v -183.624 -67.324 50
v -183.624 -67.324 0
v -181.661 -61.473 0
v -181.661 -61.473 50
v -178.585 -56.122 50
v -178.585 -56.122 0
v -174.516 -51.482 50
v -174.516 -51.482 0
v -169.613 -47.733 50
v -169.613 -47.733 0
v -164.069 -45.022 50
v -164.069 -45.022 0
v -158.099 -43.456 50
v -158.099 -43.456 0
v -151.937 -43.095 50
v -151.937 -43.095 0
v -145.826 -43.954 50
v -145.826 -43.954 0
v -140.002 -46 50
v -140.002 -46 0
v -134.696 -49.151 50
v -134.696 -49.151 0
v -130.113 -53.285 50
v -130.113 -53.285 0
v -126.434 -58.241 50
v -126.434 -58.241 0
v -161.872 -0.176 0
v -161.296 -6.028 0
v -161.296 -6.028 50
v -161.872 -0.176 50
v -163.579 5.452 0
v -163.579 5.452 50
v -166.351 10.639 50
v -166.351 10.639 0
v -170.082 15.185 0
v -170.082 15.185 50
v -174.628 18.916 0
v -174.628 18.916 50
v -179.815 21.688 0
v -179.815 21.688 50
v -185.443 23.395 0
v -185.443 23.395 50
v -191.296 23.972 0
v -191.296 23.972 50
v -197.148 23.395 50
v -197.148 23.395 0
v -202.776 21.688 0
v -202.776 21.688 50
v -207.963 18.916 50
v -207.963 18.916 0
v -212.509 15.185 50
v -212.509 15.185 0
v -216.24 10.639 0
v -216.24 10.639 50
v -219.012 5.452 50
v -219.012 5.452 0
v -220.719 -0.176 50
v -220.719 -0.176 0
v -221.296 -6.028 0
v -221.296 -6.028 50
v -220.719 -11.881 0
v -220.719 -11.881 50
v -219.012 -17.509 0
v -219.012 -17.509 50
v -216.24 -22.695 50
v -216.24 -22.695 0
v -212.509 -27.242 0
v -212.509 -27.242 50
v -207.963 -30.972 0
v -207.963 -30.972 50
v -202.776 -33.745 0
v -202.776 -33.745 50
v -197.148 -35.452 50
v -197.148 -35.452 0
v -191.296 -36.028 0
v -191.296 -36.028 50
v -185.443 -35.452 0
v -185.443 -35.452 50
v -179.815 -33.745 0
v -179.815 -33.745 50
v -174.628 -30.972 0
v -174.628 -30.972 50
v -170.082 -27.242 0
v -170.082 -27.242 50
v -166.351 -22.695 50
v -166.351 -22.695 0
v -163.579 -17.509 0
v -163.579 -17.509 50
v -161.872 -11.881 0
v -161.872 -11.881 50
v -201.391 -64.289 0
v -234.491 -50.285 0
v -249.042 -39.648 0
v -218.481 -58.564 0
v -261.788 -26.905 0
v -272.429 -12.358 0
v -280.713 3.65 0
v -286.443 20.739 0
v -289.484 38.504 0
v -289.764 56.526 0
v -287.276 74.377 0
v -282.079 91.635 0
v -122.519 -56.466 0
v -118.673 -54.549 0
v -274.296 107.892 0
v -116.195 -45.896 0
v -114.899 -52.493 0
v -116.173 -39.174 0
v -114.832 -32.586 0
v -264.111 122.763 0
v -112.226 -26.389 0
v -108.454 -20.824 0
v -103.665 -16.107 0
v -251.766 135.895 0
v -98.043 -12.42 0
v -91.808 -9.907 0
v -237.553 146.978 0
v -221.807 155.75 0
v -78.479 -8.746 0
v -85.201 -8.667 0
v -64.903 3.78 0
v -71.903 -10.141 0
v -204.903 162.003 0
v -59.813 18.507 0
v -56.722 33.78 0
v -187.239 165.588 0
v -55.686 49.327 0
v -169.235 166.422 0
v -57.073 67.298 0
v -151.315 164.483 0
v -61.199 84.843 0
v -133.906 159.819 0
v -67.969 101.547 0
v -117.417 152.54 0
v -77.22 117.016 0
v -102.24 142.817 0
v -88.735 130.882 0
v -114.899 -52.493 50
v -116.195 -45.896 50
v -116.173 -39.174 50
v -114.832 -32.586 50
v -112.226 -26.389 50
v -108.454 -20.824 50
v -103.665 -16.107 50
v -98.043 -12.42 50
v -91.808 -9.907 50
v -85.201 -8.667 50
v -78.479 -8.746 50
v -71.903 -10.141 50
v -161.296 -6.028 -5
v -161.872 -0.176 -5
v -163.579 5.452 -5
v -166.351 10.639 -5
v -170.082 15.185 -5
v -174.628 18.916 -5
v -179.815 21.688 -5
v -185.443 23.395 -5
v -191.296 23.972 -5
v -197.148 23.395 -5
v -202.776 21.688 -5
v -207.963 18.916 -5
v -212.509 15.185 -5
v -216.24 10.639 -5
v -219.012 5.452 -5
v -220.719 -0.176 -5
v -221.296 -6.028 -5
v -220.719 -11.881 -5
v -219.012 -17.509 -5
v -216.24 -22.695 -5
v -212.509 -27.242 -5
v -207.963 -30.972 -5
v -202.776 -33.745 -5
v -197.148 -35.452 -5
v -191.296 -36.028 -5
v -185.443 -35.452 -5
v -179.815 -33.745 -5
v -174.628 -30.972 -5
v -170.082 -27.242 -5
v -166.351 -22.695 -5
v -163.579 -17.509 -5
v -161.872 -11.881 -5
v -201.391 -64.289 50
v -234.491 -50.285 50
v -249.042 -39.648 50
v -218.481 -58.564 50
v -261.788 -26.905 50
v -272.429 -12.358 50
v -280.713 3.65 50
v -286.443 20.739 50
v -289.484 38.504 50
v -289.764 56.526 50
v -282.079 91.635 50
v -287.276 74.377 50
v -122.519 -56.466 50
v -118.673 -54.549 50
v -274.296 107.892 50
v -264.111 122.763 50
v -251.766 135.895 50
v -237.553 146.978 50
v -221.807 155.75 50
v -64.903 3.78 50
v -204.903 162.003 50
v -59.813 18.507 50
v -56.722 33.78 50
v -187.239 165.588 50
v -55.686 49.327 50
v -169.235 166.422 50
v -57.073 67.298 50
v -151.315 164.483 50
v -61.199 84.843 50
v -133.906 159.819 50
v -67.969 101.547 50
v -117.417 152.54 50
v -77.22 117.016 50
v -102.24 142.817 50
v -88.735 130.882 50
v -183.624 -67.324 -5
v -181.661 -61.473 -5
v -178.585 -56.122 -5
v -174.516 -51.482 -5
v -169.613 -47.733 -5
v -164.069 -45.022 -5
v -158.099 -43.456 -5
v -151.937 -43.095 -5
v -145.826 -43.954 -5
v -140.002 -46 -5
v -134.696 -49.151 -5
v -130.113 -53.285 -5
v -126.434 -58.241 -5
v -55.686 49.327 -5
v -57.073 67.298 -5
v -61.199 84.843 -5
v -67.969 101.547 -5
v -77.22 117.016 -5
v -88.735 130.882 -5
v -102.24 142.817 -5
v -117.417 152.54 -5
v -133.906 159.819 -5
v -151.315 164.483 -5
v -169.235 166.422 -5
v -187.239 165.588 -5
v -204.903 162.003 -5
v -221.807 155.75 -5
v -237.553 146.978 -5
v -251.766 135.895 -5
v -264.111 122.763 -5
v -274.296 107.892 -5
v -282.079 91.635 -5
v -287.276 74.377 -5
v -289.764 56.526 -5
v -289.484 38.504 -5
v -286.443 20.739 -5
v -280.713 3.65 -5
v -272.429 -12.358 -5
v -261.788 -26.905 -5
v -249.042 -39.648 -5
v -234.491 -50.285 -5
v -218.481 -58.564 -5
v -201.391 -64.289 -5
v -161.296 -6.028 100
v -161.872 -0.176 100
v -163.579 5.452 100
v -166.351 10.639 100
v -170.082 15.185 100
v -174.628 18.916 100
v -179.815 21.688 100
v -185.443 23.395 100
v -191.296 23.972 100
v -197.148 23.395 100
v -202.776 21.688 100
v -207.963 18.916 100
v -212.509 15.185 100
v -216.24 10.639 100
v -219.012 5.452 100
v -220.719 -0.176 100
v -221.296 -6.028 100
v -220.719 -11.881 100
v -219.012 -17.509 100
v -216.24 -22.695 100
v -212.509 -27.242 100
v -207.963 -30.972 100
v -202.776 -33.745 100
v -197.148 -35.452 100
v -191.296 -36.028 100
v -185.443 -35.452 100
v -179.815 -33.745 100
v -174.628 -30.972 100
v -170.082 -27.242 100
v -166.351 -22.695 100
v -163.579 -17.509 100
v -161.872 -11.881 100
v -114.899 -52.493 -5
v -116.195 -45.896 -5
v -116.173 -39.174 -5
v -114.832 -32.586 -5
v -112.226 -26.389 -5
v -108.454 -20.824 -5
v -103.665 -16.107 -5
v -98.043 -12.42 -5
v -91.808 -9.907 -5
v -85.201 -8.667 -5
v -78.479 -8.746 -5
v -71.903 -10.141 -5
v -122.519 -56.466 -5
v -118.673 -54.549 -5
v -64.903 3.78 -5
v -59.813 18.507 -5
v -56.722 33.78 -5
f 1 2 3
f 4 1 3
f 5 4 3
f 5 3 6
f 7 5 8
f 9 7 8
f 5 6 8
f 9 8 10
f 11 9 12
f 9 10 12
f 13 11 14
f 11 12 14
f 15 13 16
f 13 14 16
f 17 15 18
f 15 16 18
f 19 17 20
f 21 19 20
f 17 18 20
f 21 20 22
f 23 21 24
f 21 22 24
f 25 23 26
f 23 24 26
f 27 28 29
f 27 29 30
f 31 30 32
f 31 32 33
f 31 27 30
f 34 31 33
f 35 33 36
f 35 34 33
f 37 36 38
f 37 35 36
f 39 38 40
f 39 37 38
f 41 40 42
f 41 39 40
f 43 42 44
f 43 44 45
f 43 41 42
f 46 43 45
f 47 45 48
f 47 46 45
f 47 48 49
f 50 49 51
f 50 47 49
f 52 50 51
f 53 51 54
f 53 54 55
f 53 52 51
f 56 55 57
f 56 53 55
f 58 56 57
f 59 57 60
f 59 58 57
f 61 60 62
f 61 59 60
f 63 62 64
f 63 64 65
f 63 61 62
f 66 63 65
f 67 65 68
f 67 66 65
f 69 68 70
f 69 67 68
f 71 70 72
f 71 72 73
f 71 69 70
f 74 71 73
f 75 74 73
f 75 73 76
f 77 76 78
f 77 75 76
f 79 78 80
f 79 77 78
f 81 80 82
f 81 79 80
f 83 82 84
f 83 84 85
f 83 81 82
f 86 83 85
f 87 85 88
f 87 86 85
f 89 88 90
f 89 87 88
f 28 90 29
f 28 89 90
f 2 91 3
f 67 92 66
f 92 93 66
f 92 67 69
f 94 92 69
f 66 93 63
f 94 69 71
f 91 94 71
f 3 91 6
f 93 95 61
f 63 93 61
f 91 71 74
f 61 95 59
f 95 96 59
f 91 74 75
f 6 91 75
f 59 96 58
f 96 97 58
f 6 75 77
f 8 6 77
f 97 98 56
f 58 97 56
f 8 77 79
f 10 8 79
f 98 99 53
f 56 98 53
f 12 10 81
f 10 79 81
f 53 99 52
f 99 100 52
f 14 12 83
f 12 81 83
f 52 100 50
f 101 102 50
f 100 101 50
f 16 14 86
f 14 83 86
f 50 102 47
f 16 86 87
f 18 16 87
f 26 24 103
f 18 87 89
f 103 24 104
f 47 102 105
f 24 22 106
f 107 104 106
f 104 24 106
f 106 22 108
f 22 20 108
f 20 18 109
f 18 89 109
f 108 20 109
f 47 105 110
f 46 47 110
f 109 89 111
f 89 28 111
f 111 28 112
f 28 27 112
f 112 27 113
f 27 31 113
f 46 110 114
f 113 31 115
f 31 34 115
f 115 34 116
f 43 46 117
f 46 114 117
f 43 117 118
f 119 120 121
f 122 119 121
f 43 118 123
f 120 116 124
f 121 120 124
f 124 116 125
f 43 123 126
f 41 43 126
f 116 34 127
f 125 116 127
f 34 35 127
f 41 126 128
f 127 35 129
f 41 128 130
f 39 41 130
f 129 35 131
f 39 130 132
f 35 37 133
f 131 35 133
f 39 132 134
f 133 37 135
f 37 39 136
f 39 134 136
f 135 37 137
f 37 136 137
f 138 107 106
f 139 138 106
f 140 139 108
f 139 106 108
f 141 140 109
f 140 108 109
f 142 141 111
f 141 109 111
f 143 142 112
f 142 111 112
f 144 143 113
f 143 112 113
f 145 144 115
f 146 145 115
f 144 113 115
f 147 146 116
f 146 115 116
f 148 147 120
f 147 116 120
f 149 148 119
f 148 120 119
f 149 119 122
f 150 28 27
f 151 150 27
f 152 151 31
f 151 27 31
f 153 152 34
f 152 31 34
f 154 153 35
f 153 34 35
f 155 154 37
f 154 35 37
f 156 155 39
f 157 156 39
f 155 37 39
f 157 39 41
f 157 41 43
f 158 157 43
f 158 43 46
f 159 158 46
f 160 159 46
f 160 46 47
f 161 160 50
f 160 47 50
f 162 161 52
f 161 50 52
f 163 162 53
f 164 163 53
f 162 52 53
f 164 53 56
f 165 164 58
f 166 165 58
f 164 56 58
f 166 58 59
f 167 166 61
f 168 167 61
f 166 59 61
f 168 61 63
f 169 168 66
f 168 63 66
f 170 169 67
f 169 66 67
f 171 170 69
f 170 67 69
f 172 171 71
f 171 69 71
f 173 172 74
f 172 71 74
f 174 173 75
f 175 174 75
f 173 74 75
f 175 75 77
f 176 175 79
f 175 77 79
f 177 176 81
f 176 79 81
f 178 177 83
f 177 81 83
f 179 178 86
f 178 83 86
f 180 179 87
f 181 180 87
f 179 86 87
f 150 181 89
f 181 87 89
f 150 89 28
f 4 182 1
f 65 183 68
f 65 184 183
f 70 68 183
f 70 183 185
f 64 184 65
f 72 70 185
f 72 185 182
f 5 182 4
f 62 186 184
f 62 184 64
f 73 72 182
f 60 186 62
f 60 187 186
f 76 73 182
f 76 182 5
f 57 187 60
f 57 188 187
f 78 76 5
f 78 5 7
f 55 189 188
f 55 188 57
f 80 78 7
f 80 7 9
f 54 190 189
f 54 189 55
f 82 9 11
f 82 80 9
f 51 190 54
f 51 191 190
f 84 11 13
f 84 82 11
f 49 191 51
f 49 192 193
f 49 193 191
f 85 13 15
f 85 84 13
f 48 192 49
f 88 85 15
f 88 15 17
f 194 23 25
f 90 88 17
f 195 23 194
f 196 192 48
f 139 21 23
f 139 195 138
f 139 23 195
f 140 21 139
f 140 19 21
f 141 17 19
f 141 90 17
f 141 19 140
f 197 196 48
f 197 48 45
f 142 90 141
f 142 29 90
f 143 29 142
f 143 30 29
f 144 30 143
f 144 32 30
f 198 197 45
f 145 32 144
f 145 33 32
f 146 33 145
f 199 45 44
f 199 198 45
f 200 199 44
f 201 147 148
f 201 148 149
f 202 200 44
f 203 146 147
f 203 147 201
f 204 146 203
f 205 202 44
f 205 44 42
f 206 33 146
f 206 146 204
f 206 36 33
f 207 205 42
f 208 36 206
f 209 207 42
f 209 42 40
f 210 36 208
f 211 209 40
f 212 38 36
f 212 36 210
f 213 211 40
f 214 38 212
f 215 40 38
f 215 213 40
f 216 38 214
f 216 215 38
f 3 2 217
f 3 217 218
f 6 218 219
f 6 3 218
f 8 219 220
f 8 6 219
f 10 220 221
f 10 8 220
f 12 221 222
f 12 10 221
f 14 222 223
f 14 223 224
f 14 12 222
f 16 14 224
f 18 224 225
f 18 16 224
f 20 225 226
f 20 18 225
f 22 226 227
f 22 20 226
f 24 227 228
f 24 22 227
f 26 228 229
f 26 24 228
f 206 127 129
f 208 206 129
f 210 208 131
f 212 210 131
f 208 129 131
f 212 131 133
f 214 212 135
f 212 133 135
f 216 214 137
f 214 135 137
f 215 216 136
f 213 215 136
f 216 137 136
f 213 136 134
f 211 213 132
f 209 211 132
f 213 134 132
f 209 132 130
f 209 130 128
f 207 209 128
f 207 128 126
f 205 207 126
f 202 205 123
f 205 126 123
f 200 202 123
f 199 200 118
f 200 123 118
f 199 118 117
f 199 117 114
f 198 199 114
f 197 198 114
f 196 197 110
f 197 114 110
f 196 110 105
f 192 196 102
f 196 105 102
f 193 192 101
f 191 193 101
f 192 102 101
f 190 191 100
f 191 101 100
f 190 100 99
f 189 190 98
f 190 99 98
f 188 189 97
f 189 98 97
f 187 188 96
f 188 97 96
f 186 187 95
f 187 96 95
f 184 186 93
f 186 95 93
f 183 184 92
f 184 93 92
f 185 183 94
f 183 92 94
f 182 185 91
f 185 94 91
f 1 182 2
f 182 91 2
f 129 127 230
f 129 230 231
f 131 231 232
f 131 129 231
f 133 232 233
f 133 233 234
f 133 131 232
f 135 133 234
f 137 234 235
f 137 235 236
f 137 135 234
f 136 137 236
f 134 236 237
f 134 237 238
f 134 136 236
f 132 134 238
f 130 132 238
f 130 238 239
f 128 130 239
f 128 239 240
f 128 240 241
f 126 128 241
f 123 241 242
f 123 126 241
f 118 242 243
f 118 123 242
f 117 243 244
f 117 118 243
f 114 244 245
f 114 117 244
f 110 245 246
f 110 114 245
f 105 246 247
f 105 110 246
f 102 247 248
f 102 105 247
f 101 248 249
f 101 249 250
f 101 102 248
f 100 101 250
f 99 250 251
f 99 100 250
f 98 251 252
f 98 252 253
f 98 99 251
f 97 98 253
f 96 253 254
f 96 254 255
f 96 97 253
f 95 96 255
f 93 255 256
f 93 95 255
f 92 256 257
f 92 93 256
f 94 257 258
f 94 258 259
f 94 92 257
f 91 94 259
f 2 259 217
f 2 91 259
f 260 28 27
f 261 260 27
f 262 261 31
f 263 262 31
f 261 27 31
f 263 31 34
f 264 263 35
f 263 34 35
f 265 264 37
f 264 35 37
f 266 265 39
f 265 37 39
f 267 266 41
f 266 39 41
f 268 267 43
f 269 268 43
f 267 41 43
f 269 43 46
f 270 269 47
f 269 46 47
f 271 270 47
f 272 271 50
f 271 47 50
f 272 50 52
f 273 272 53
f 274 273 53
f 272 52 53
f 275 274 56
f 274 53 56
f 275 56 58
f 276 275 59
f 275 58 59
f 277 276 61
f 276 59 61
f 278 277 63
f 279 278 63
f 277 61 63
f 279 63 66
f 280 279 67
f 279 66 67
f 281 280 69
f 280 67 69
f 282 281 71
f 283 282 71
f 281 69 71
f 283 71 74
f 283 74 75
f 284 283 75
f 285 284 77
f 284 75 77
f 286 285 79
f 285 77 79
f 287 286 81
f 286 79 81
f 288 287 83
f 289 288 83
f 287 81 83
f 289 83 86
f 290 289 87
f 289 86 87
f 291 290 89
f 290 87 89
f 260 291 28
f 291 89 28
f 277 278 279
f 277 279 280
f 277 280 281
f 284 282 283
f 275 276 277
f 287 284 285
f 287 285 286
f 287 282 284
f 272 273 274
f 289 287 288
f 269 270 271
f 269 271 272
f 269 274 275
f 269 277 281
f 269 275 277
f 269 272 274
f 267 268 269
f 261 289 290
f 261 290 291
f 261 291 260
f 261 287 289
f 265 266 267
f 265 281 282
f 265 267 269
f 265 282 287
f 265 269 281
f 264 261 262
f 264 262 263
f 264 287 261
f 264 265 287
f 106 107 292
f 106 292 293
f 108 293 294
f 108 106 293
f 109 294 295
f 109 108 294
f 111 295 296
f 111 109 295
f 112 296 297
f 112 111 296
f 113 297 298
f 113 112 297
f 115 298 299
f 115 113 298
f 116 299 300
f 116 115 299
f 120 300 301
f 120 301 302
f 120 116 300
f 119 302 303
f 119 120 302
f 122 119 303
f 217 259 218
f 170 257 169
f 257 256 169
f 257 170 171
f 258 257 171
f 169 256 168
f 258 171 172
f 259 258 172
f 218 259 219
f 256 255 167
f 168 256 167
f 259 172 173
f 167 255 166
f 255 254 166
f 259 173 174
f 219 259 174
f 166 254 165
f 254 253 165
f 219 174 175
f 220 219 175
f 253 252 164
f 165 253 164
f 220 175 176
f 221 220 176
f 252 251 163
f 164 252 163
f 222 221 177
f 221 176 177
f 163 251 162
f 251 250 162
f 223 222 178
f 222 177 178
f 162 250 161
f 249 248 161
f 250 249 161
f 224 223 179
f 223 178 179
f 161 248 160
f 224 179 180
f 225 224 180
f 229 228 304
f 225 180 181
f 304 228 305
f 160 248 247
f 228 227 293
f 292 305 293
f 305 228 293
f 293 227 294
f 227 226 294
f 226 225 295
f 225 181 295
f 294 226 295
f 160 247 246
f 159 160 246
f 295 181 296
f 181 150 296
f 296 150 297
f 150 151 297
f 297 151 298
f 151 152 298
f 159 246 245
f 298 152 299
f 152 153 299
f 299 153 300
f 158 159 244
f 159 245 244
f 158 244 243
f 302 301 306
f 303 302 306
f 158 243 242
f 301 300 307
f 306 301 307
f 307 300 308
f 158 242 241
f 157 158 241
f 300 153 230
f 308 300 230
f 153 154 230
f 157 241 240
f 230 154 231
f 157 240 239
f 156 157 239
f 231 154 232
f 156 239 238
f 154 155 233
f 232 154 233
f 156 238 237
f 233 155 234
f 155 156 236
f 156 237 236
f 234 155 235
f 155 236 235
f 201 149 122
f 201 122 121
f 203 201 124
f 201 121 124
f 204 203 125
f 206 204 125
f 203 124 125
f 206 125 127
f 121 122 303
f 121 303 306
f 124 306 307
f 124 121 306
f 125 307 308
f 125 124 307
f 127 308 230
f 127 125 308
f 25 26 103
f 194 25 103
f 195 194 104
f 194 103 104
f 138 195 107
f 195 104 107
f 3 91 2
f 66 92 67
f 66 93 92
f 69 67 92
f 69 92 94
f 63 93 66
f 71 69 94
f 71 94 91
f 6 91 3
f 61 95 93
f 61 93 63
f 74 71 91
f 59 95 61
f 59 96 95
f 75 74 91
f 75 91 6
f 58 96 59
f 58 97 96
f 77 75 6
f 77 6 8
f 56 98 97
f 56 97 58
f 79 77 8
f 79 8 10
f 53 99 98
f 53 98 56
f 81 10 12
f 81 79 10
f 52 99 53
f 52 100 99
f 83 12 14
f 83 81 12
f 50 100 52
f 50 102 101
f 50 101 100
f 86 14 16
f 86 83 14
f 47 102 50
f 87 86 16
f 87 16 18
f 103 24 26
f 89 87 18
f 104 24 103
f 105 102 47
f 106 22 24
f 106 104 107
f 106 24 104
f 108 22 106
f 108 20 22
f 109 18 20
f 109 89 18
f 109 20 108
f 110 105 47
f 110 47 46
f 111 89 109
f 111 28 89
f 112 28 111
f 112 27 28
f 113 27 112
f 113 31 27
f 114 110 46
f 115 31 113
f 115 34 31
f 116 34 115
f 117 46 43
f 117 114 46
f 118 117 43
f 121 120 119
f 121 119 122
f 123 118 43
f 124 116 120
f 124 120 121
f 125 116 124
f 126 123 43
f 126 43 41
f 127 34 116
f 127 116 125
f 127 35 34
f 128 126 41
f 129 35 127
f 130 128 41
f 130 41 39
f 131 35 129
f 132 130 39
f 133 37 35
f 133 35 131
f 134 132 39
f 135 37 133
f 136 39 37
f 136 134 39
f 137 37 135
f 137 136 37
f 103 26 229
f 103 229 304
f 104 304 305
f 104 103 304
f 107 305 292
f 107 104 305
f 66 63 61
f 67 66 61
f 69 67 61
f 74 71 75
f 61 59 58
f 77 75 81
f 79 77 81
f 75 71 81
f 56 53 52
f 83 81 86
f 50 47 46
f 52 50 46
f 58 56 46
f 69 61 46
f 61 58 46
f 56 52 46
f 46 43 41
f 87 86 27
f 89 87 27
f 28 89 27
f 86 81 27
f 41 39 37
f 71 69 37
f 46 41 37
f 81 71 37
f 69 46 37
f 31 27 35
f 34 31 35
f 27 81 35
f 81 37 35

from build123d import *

# Parameters (mm, degrees)
F0_R     = 30
F1_DEPTH = 50
F2_DEPTH = 5
F4_DEPTH = 100


# Not quite as in the source:
# - a feature of the source that left no trace in its solid (it failed there, or was rolled back) is left out


with BuildPart() as f1:
    # F0 (on Top) → F1 (new body)
    with BuildSketch(Plane.XY):
        with BuildLine():
            ThreePointArc((-114.899057503, -52.4928103005), (-106.1762880018, -18.347124739), (-71.9026529407, -10.1414870467))
            ThreePointArc((-71.9026529407, -10.1414870467), (-59.8128831647, 18.5072886108), (-55.6860420642, 49.3274778128))
            ThreePointArc((-55.6860420642, 49.3274778128), (-251.7662613014, 135.8951011853), (-183.6243150436, -67.3241915816))
            ThreePointArc((-183.6243150436, -67.3241915816), (-158.098661689, -43.4558474163), (-126.4336973653, -58.2405309352))
            ThreePointArc((-126.4336973653, -58.2405309352), (-120.5872807659, -55.5254033818), (-114.899057503, -52.4928103005))
        make_face()
        with Locations((-191.2955716252, -6.0283541679)):
            Circle(F0_R, mode=Mode.SUBTRACT)
    extrude(amount=F1_DEPTH)


with BuildPart() as f2:
    # F2 (new): a face of the model
    f2_faces = [f1.part.faces().sort_by_distance(p)[0] for p in [
        (-173.744285094, 57.9244090181, 0),
    ]]
    extrude(f2_faces, amount=F2_DEPTH)


with BuildPart() as f4:
    # F0 (on Top) → F4 (new body)
    with BuildSketch(Plane.XY):
        with Locations((-191.2955716252, -6.0283541679)):
            Circle(F0_R)
    extrude(amount=F4_DEPTH)


solid = Compound([f1.part, f2.part, f4.part])
